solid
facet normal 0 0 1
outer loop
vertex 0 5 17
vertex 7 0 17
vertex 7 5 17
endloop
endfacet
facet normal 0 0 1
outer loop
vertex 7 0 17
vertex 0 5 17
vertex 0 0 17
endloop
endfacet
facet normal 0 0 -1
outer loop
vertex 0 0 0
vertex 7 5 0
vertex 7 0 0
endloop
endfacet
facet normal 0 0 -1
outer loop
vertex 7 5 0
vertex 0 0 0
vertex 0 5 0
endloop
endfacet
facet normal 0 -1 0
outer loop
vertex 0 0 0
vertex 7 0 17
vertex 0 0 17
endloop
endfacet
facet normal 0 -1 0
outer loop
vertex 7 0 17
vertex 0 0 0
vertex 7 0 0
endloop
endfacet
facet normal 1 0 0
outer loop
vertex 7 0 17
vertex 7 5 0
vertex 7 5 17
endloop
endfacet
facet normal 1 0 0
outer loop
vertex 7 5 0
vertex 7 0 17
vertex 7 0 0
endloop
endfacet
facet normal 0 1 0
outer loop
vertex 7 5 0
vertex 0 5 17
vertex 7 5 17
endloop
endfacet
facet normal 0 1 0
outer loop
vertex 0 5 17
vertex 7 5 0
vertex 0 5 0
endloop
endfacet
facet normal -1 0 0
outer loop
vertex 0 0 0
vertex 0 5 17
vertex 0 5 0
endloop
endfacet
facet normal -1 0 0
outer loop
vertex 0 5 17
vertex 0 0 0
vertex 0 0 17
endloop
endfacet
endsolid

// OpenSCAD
// Generated by SolidPython 1.0.1 on 2020-07-29 00:46:55


cube(size = [7, 5, 17]);
/***********************************************
*********      SolidPython code:      **********
************************************************
 
# import packages: SolidPython
from solid import *
from solid.utils import *
from itertools import chain, combinations, permutations


class Resize:

    def __init__(self, scad_file):
        self.scad_file = scad_file
        #self.scad_file = import_scad(scad_file)
        # cone/cylinder param:
        self.r1 = 0
        self.r2 = 0
        self.h = 0
        # rectangular prism param:
        self.w = 0
        self.l = 0
        # ellipse param:
        self.r = 0

    # import OpenScad code (file name corresponds to shape)


    # classify shape + parameters
    def assign(self, param1, param2, param3):
        if self.scad_file == 'cone.scad':
            self.r1 = param1
            self.r2 = param2
            self.h = param3
        elif self.scad_file == 'cylinder.scad':
            self.r1 = param1
            self.r2 = param2
            self.h = param3
        elif self.scad_file == 'rectangularPrism.scad':
            self.h = param1
            self.l = param2
            self.w = param3
        else:
            self.r = param1
            self.h = param2

    # resize parameters
    def iterate(self):
        x = range(3, 20, 2)
        i = 1
        if self.scad_file == 'cone.scad':
            tempList = list(permutations(x, 2))
            for temp in tempList:
                param1 = temp[0]
                param2 = temp[1]
                filepath = 'produced_scad_files/' + 'cone' + str(param1) + '_' + str(param2) + '_' + '.scad'
                scad_render_to_file(cylinder(h=param1, r1=param2, r2=0), filepath)

        elif self.scad_file == 'cylinder.scad':
            tempList = list(permutations(x, 3))
            for temp in tempList:
                param1 = temp[0]
                param2 = temp[1]
                filepath = 'produced_scad_files/' + 'cylinder' + str(param1) + '_' + str(param2) + '_' + '.scad'
                scad_render_to_file(cylinder(h=param1, r1=param2, r2=param2), filepath)

        elif self.scad_file == 'rectangularPrism.scad':
            tempList = list(permutations(x, 3))
            for temp in tempList:
                param1 = temp[0]
                param2 = temp[1]
                param3 = temp[2]
                filepath = 'produced_scad_files/' + 'rectangularPrism' + str(param1) + '_' + str(param2) + '_' + str(
                    param3) + '.scad'
                scad_render_to_file(cube(size=(param1, param2, param3)), filepath)

        elif self.scad_file == 'ellipse.scad':
            tempList = list(permutations(x, 4))
            for temp in tempList:
                param1 = temp[0]
                param2 = temp[1]
                param3 = temp[2]
                param4 = temp[3]
                filepath = 'produced_scad_files/' + 'ellipse' + str(param1) + '_' + str(param2) + '_' + str(param3) + '_' + str(param4) + '.scad'
                scad_render_to_file(scale([param1, param2, param3])(sphere(r=param4)), filepath)

    def render_to_scadfile(self):
        scad_render_to_file(scad, 'example.scad') 
 
************************************************/
